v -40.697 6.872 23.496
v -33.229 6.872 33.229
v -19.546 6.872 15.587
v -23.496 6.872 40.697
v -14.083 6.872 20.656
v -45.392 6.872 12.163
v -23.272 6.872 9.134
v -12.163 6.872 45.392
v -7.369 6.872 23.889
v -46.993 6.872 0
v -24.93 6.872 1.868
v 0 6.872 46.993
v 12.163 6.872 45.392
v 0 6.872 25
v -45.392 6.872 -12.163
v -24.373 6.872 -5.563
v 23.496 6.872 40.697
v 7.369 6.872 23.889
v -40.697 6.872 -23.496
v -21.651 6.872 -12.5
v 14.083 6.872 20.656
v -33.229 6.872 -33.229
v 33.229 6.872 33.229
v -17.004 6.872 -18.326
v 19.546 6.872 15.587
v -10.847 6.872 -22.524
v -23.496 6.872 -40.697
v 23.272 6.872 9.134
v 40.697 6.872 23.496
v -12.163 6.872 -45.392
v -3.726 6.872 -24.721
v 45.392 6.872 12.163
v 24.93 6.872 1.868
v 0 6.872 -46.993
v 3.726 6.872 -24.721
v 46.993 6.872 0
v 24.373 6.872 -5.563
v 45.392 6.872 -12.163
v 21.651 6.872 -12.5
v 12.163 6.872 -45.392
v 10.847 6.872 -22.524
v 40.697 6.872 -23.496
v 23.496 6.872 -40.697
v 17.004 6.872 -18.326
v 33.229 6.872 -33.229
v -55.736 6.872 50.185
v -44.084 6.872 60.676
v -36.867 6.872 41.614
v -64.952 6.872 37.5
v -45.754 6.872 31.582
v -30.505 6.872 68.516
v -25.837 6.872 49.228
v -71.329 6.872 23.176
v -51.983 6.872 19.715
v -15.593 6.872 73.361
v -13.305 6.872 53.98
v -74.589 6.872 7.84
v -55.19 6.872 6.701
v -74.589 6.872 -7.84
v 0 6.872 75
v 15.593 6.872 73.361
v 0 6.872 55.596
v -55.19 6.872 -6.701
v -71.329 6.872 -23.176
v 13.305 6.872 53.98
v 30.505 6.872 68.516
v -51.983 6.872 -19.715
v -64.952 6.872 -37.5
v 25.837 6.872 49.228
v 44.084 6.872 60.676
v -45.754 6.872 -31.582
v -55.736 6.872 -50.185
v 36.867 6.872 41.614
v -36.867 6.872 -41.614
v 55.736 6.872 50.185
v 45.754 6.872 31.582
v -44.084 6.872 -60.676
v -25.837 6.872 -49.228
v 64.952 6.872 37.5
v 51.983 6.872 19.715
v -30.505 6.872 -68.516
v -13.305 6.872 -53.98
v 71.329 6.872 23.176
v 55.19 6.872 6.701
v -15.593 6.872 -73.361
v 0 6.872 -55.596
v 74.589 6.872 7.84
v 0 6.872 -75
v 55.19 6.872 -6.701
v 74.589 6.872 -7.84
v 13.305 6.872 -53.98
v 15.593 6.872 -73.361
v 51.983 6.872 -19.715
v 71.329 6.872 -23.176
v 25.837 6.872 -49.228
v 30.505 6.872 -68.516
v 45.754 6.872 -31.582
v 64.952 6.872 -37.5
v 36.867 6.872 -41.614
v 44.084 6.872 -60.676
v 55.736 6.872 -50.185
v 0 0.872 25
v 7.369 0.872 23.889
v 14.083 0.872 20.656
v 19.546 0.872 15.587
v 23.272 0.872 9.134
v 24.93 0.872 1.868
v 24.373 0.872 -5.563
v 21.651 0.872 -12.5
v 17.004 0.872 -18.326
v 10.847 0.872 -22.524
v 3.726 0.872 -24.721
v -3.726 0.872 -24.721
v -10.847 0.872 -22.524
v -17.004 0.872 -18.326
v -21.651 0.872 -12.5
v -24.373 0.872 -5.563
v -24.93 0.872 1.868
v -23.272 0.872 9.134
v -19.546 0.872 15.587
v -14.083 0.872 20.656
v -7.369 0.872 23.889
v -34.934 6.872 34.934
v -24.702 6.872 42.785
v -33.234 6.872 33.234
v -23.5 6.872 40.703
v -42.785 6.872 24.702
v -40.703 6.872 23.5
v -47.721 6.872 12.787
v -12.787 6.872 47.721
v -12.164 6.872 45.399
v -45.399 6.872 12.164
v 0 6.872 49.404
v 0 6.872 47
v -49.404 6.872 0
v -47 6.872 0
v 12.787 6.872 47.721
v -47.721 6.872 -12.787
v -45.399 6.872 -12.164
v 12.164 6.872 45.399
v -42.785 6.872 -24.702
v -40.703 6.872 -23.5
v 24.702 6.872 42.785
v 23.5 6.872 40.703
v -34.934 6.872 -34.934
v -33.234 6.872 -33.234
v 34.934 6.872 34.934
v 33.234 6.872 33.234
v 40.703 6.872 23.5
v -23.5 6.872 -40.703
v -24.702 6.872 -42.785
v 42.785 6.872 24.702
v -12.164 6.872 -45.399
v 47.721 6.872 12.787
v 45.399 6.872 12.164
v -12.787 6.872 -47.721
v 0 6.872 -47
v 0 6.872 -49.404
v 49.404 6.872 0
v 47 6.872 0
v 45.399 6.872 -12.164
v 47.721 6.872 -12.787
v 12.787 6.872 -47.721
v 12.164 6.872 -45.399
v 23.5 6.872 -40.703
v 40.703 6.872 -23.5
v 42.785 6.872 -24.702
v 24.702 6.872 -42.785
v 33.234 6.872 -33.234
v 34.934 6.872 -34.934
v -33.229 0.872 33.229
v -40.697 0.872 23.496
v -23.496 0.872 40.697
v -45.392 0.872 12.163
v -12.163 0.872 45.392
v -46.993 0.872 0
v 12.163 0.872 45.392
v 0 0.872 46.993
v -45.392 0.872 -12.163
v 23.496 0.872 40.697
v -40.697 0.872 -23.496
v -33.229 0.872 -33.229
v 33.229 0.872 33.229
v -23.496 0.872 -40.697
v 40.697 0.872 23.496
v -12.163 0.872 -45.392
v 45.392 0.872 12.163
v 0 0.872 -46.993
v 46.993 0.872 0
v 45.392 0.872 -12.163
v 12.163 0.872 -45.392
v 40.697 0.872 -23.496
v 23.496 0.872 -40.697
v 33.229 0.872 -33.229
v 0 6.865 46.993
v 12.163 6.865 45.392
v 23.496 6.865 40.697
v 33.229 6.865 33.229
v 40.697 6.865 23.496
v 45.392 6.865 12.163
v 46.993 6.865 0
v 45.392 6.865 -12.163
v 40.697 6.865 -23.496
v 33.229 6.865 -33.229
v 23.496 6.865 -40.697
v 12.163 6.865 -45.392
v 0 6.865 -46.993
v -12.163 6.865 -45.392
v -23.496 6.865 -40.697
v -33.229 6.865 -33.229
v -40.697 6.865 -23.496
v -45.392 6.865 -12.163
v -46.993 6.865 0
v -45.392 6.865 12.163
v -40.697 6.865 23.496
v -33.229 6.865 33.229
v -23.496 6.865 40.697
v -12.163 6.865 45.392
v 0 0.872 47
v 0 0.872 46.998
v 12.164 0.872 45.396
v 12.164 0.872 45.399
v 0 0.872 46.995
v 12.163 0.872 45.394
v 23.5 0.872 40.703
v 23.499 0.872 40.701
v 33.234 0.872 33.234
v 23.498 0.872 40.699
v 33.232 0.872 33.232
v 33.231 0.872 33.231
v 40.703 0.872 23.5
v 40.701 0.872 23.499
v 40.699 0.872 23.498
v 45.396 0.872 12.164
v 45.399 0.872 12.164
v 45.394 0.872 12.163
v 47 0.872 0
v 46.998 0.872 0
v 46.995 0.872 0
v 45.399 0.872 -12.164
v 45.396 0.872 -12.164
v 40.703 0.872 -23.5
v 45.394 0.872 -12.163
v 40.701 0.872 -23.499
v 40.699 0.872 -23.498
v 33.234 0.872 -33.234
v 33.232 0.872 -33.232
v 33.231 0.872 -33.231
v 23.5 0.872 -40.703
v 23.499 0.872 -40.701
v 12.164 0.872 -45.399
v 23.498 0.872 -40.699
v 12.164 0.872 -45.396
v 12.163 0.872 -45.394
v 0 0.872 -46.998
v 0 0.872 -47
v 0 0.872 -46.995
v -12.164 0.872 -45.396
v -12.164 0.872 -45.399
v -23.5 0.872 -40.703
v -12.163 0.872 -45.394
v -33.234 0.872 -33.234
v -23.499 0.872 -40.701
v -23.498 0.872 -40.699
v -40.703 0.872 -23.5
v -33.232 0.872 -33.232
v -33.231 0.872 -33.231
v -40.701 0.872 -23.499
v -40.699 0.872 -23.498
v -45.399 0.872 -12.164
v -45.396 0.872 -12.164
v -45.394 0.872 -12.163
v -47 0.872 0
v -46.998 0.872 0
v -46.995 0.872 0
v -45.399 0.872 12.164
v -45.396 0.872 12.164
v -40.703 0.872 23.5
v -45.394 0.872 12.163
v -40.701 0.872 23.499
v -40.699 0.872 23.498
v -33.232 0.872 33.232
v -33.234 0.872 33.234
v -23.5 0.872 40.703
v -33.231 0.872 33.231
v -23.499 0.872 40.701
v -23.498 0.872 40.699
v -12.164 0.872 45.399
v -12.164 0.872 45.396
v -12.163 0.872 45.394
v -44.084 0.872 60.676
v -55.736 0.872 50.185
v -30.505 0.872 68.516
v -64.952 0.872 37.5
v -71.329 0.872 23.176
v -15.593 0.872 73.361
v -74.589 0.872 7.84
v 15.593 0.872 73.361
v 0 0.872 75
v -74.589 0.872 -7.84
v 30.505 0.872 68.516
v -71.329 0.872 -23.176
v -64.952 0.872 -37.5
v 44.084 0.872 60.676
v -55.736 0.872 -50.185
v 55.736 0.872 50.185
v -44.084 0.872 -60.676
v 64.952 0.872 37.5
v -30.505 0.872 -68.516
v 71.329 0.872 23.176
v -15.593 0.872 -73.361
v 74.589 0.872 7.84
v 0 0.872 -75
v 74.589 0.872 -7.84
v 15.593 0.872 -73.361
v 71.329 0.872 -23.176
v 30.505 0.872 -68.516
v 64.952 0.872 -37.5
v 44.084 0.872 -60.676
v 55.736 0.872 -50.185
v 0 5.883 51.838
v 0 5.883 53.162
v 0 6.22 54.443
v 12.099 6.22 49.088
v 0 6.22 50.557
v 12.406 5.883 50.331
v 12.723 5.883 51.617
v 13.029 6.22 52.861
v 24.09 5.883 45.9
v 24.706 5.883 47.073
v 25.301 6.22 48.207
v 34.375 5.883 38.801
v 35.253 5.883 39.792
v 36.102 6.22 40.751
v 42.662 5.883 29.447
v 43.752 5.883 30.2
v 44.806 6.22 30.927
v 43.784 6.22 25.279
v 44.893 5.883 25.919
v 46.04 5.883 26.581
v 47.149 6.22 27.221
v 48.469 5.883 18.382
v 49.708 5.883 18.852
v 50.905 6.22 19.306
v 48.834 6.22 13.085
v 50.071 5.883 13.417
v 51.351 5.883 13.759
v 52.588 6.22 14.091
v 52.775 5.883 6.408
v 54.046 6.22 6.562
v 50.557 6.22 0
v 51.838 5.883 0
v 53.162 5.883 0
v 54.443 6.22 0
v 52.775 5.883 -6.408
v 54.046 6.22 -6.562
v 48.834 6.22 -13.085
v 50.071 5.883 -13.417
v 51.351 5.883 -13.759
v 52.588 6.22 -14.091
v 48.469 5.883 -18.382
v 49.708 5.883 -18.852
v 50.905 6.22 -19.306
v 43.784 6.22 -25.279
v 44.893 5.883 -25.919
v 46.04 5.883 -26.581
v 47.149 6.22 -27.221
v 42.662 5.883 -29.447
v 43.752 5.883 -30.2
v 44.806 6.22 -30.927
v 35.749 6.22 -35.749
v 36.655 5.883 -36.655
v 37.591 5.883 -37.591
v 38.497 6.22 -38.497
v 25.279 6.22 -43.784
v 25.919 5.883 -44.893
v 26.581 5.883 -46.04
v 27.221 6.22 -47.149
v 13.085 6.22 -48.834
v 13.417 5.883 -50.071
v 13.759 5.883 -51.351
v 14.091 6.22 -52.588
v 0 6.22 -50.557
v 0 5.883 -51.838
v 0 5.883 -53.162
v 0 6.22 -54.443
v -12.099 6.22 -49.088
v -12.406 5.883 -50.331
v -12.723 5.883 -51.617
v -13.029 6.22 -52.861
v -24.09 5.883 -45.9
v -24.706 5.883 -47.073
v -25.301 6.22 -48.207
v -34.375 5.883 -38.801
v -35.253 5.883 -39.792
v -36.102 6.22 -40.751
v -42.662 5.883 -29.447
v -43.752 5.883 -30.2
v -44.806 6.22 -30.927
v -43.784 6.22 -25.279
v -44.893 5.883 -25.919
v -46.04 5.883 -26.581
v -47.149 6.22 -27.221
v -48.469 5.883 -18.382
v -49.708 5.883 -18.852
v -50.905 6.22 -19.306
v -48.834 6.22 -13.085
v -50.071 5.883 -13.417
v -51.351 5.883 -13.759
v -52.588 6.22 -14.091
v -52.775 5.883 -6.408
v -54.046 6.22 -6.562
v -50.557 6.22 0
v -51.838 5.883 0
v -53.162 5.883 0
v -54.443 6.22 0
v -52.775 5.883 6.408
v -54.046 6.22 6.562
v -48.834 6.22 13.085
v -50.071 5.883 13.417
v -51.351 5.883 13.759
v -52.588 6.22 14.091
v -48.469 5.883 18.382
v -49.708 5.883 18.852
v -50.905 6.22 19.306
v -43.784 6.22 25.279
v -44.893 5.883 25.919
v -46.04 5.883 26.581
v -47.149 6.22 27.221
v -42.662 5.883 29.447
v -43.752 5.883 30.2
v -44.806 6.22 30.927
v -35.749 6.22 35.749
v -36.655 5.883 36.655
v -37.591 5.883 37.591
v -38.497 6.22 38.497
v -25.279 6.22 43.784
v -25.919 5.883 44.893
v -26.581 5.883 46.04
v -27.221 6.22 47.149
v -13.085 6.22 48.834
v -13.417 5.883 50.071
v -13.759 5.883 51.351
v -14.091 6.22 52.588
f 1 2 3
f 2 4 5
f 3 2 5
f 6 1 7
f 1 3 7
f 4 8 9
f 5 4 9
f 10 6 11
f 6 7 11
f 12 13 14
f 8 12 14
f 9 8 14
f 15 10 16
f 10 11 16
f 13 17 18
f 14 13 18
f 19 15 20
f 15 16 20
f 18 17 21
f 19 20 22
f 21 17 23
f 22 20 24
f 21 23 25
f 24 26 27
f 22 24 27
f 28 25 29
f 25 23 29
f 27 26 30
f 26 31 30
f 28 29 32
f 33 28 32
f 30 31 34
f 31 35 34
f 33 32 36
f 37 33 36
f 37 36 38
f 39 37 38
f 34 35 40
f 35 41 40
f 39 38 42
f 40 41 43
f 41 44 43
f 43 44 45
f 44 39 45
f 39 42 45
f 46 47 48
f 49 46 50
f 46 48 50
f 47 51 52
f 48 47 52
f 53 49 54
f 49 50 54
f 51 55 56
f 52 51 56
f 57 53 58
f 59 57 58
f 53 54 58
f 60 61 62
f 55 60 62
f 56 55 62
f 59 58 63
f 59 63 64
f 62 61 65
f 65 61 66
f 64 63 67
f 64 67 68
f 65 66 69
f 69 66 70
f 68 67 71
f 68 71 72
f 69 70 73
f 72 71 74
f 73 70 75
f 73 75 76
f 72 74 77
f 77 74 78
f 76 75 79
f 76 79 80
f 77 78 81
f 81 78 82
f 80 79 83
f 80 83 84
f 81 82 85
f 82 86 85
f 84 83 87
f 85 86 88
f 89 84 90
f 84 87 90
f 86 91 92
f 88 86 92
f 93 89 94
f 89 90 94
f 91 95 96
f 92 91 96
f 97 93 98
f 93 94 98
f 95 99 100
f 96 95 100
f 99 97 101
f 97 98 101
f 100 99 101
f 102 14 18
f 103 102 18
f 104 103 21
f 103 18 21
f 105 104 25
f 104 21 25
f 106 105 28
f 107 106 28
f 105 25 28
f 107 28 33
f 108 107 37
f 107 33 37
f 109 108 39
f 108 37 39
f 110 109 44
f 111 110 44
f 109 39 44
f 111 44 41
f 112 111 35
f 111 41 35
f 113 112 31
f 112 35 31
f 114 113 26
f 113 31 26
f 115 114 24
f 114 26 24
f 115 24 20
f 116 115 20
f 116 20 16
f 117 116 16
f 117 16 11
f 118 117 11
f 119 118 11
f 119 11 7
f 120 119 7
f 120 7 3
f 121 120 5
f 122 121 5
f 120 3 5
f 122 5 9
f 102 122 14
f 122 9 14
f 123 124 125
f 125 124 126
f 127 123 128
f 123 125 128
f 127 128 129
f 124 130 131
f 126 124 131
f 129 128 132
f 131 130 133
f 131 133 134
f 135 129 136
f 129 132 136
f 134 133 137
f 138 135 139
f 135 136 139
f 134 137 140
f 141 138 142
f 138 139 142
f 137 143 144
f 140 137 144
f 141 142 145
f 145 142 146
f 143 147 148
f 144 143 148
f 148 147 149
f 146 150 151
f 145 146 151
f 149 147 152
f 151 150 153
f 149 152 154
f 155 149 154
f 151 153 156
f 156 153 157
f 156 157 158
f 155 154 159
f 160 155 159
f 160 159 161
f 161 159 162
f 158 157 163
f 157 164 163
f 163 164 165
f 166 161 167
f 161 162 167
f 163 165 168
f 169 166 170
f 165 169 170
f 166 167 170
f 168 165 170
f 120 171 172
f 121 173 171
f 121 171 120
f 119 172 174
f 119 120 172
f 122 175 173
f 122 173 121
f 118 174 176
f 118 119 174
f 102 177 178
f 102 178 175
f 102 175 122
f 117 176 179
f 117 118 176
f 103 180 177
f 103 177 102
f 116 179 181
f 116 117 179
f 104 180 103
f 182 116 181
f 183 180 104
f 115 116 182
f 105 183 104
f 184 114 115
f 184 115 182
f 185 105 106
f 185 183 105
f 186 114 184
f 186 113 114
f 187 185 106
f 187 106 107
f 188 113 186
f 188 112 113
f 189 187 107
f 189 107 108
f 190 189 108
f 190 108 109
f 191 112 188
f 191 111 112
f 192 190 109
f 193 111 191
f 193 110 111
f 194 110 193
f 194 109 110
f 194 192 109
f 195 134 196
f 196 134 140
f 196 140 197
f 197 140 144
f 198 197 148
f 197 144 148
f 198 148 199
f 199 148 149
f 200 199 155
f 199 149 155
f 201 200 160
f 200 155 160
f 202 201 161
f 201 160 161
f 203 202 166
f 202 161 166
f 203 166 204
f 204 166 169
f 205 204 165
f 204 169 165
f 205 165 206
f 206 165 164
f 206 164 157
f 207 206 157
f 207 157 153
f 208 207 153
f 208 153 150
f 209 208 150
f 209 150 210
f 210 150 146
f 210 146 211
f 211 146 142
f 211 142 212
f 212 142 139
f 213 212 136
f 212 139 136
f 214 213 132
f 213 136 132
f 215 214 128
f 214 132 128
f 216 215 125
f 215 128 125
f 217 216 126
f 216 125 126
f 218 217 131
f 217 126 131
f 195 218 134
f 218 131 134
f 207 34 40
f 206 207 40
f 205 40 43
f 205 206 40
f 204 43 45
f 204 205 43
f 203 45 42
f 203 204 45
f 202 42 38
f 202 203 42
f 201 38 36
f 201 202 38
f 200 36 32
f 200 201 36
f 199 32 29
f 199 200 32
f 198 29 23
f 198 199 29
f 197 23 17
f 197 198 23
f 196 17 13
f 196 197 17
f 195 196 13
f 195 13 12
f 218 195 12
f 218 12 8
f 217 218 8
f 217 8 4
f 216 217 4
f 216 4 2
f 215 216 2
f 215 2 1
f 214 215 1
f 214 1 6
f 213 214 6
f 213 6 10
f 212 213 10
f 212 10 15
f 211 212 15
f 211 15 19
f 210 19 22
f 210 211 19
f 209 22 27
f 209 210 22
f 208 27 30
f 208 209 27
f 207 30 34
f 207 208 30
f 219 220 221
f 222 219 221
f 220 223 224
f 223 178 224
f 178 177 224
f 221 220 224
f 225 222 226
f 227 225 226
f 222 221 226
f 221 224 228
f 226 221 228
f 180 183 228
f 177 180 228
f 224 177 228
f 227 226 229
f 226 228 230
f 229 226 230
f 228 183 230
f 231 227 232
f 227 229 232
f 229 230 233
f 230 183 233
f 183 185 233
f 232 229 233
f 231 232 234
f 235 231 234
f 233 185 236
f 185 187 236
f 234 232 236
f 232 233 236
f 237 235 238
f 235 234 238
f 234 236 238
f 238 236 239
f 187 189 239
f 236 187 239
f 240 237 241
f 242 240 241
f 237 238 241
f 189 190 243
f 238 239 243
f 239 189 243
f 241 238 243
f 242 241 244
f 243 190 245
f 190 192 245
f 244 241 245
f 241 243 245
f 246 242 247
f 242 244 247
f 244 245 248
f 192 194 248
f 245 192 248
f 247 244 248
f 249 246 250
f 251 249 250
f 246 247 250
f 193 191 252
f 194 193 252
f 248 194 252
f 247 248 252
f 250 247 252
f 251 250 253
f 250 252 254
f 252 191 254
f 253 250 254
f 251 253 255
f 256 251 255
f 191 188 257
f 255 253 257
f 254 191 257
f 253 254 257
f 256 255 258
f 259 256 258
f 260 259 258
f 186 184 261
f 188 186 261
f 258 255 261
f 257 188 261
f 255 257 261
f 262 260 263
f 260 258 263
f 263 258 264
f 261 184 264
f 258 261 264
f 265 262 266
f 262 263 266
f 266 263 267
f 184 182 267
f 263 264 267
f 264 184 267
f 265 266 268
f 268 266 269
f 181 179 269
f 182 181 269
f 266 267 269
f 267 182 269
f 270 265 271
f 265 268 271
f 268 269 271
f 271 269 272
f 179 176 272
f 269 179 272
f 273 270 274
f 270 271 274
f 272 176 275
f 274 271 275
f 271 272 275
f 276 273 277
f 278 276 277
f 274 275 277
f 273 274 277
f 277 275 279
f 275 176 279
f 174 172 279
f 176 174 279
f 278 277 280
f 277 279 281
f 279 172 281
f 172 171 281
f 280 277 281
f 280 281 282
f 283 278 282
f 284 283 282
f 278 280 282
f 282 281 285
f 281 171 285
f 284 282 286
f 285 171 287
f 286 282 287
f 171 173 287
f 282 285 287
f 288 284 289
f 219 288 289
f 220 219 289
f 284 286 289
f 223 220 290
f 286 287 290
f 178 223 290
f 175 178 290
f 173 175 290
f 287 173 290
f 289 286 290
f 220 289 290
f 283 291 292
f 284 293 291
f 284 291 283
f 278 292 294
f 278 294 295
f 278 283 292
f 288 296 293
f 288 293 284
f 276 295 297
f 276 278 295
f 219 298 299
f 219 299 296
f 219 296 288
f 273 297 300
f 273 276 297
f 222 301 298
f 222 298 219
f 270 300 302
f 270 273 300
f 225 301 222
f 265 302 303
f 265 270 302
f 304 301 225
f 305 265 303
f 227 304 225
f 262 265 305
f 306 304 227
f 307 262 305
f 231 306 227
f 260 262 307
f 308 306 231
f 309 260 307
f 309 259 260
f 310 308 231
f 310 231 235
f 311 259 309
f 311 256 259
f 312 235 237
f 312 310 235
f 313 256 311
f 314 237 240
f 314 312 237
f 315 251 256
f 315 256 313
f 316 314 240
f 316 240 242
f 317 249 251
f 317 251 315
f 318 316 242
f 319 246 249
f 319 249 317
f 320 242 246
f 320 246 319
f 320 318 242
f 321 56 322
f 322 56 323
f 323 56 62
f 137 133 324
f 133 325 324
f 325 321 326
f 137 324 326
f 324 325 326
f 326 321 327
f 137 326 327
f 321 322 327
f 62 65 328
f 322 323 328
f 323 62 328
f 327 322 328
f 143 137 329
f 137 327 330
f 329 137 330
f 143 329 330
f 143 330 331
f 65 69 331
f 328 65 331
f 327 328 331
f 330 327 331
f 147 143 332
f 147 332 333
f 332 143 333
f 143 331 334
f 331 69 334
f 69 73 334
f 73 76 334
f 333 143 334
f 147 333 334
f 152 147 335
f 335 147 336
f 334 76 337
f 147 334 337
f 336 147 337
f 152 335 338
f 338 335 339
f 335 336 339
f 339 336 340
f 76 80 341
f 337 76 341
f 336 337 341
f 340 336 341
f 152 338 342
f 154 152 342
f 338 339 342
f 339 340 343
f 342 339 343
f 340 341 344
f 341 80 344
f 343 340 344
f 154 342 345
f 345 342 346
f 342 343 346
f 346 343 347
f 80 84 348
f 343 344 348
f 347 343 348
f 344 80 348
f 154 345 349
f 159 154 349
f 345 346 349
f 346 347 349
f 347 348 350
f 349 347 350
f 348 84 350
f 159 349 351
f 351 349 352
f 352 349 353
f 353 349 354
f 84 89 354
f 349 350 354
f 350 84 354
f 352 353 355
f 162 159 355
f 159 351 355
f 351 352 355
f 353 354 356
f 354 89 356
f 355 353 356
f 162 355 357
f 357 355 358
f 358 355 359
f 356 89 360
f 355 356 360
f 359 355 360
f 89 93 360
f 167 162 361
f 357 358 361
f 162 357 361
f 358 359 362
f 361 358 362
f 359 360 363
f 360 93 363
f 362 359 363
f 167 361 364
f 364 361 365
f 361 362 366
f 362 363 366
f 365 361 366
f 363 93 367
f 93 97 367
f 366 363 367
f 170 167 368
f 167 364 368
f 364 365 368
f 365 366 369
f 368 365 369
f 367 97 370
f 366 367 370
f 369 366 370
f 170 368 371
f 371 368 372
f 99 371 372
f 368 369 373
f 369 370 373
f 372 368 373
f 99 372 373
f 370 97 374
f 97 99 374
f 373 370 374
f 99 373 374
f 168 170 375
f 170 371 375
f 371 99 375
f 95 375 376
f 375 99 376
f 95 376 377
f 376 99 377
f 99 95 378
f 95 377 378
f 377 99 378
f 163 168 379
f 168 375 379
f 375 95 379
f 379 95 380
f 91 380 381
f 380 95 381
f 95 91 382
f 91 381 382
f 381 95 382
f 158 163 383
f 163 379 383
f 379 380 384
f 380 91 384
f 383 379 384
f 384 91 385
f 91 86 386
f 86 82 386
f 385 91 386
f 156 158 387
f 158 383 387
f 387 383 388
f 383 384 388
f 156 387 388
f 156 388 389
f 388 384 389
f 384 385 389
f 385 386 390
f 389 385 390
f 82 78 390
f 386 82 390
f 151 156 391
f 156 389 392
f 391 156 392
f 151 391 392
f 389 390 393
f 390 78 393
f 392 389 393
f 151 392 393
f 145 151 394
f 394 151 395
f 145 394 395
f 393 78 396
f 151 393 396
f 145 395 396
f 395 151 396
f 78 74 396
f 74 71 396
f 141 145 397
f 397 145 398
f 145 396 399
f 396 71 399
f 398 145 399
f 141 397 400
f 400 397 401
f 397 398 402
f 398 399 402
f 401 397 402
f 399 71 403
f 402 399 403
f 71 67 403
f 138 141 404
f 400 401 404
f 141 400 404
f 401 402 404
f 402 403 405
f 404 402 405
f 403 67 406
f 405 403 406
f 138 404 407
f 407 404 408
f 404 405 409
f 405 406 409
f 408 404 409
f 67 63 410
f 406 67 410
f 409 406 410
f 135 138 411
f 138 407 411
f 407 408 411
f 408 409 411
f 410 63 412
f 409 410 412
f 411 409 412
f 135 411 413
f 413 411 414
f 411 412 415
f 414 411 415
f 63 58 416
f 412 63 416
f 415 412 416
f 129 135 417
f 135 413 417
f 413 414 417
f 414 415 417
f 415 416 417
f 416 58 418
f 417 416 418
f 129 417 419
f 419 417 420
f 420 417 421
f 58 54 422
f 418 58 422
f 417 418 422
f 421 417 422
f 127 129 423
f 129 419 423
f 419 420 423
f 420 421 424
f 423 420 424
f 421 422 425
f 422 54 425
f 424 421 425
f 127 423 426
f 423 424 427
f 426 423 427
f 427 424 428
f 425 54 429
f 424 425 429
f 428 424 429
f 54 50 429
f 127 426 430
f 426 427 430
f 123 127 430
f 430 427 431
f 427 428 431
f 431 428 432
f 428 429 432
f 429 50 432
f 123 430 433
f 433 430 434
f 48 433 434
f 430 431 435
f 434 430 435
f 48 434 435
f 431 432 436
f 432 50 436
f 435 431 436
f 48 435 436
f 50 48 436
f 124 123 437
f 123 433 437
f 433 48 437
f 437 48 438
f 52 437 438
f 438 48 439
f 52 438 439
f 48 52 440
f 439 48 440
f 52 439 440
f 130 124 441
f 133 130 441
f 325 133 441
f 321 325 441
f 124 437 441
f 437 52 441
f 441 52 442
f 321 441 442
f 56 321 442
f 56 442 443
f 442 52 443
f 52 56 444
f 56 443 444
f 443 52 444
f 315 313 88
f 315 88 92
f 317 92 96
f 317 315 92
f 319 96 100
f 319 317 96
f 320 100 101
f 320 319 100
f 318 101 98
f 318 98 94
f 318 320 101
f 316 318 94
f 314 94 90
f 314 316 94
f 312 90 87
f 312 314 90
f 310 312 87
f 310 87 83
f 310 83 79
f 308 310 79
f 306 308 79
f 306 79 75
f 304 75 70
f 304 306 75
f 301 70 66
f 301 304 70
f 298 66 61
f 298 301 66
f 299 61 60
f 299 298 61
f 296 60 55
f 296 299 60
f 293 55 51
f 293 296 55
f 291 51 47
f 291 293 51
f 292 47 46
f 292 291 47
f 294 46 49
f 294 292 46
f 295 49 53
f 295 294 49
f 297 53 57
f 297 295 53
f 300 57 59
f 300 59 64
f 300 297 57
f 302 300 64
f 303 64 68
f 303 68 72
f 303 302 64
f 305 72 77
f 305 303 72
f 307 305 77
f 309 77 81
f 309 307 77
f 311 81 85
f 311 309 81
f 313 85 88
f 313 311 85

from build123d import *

# Parameters (mm, degrees)
SKETCH2_R           = 75
SKETCH2_R_2         = 59
SKETCH2_R_3         = 46.992946112
BOSS_EXTRUDE1_DEPTH = 6
SKETCH8_R           = 25
CUT_EXTRUDE4_DEPTH  = 6


with BuildPart() as part:
    # Sketch1 → Revolve1 (revolve)
    with BuildSketch(Plane(origin=(0, 0, 0), x_dir=(-1, 0, 0), z_dir=(0, 0, -1)), mode=Mode.PRIVATE) as revolve1_sk:
        with BuildLine():
            Line((-59, 0.8724), (-47, 0.8724))
            ThreePointArc((-47, 0.8724), (-46.292893219, 1.165293219), (-46, 1.8724))
            Line((-46, 1.8724), (-46, 5.8724))
            Line((-46, 5.8724), (-47, 6.8724))
            Line((-47, 6.8724), (-49.4043, 6.8724))
            ThreePointArc((-49.4043, 6.8724), (-52.5, 5.8405), (-55.5957, 6.8724))
            Line((-55.5957, 6.8724), (-59, 6.8724))
            Line((-59, 6.8724), (-60, 5.8724))
            Line((-60, 5.8724), (-60, 1.8724))
            ThreePointArc((-60, 1.8724), (-59.707106781, 1.165293219), (-59, 0.8724))
        make_face()
    revolve(revolve1_sk.sketch.rotate(Axis((0, 0, 0), (0, 1, 0)), 270), axis=Axis((0, 0, 0), (0, 1, 0)))

    # Sketch2 → Boss-Extrude1 (add)
    # profile 1 of 2: a face of its own
    with BuildSketch(Plane.XZ.offset(-0.8724)):
        with Locations(Location((0, 0, 0), (0, 0, 270))):
            Circle(SKETCH2_R)
        Circle(SKETCH2_R_2, mode=Mode.SUBTRACT)
    # profile 2 of 2: a face of its own
    with BuildSketch(Plane.XZ.offset(-0.8724)):
        with Locations(Location((0, 0, 0), (0, 0, 270))):
            Circle(SKETCH2_R_3)
    extrude(amount=-BOSS_EXTRUDE1_DEPTH)

    # Sketch8 → Cut-Extrude4 (cut)
    with BuildSketch(Plane(origin=(0, 6.8724, 0), x_dir=(1, 0, 0), z_dir=(0, 1, 0))):
        with Locations(Location((0, 0, 0), (0, 0, 270))):
            Circle(SKETCH8_R)
    extrude(amount=-CUT_EXTRUDE4_DEPTH, mode=Mode.SUBTRACT)


solid = part.part
